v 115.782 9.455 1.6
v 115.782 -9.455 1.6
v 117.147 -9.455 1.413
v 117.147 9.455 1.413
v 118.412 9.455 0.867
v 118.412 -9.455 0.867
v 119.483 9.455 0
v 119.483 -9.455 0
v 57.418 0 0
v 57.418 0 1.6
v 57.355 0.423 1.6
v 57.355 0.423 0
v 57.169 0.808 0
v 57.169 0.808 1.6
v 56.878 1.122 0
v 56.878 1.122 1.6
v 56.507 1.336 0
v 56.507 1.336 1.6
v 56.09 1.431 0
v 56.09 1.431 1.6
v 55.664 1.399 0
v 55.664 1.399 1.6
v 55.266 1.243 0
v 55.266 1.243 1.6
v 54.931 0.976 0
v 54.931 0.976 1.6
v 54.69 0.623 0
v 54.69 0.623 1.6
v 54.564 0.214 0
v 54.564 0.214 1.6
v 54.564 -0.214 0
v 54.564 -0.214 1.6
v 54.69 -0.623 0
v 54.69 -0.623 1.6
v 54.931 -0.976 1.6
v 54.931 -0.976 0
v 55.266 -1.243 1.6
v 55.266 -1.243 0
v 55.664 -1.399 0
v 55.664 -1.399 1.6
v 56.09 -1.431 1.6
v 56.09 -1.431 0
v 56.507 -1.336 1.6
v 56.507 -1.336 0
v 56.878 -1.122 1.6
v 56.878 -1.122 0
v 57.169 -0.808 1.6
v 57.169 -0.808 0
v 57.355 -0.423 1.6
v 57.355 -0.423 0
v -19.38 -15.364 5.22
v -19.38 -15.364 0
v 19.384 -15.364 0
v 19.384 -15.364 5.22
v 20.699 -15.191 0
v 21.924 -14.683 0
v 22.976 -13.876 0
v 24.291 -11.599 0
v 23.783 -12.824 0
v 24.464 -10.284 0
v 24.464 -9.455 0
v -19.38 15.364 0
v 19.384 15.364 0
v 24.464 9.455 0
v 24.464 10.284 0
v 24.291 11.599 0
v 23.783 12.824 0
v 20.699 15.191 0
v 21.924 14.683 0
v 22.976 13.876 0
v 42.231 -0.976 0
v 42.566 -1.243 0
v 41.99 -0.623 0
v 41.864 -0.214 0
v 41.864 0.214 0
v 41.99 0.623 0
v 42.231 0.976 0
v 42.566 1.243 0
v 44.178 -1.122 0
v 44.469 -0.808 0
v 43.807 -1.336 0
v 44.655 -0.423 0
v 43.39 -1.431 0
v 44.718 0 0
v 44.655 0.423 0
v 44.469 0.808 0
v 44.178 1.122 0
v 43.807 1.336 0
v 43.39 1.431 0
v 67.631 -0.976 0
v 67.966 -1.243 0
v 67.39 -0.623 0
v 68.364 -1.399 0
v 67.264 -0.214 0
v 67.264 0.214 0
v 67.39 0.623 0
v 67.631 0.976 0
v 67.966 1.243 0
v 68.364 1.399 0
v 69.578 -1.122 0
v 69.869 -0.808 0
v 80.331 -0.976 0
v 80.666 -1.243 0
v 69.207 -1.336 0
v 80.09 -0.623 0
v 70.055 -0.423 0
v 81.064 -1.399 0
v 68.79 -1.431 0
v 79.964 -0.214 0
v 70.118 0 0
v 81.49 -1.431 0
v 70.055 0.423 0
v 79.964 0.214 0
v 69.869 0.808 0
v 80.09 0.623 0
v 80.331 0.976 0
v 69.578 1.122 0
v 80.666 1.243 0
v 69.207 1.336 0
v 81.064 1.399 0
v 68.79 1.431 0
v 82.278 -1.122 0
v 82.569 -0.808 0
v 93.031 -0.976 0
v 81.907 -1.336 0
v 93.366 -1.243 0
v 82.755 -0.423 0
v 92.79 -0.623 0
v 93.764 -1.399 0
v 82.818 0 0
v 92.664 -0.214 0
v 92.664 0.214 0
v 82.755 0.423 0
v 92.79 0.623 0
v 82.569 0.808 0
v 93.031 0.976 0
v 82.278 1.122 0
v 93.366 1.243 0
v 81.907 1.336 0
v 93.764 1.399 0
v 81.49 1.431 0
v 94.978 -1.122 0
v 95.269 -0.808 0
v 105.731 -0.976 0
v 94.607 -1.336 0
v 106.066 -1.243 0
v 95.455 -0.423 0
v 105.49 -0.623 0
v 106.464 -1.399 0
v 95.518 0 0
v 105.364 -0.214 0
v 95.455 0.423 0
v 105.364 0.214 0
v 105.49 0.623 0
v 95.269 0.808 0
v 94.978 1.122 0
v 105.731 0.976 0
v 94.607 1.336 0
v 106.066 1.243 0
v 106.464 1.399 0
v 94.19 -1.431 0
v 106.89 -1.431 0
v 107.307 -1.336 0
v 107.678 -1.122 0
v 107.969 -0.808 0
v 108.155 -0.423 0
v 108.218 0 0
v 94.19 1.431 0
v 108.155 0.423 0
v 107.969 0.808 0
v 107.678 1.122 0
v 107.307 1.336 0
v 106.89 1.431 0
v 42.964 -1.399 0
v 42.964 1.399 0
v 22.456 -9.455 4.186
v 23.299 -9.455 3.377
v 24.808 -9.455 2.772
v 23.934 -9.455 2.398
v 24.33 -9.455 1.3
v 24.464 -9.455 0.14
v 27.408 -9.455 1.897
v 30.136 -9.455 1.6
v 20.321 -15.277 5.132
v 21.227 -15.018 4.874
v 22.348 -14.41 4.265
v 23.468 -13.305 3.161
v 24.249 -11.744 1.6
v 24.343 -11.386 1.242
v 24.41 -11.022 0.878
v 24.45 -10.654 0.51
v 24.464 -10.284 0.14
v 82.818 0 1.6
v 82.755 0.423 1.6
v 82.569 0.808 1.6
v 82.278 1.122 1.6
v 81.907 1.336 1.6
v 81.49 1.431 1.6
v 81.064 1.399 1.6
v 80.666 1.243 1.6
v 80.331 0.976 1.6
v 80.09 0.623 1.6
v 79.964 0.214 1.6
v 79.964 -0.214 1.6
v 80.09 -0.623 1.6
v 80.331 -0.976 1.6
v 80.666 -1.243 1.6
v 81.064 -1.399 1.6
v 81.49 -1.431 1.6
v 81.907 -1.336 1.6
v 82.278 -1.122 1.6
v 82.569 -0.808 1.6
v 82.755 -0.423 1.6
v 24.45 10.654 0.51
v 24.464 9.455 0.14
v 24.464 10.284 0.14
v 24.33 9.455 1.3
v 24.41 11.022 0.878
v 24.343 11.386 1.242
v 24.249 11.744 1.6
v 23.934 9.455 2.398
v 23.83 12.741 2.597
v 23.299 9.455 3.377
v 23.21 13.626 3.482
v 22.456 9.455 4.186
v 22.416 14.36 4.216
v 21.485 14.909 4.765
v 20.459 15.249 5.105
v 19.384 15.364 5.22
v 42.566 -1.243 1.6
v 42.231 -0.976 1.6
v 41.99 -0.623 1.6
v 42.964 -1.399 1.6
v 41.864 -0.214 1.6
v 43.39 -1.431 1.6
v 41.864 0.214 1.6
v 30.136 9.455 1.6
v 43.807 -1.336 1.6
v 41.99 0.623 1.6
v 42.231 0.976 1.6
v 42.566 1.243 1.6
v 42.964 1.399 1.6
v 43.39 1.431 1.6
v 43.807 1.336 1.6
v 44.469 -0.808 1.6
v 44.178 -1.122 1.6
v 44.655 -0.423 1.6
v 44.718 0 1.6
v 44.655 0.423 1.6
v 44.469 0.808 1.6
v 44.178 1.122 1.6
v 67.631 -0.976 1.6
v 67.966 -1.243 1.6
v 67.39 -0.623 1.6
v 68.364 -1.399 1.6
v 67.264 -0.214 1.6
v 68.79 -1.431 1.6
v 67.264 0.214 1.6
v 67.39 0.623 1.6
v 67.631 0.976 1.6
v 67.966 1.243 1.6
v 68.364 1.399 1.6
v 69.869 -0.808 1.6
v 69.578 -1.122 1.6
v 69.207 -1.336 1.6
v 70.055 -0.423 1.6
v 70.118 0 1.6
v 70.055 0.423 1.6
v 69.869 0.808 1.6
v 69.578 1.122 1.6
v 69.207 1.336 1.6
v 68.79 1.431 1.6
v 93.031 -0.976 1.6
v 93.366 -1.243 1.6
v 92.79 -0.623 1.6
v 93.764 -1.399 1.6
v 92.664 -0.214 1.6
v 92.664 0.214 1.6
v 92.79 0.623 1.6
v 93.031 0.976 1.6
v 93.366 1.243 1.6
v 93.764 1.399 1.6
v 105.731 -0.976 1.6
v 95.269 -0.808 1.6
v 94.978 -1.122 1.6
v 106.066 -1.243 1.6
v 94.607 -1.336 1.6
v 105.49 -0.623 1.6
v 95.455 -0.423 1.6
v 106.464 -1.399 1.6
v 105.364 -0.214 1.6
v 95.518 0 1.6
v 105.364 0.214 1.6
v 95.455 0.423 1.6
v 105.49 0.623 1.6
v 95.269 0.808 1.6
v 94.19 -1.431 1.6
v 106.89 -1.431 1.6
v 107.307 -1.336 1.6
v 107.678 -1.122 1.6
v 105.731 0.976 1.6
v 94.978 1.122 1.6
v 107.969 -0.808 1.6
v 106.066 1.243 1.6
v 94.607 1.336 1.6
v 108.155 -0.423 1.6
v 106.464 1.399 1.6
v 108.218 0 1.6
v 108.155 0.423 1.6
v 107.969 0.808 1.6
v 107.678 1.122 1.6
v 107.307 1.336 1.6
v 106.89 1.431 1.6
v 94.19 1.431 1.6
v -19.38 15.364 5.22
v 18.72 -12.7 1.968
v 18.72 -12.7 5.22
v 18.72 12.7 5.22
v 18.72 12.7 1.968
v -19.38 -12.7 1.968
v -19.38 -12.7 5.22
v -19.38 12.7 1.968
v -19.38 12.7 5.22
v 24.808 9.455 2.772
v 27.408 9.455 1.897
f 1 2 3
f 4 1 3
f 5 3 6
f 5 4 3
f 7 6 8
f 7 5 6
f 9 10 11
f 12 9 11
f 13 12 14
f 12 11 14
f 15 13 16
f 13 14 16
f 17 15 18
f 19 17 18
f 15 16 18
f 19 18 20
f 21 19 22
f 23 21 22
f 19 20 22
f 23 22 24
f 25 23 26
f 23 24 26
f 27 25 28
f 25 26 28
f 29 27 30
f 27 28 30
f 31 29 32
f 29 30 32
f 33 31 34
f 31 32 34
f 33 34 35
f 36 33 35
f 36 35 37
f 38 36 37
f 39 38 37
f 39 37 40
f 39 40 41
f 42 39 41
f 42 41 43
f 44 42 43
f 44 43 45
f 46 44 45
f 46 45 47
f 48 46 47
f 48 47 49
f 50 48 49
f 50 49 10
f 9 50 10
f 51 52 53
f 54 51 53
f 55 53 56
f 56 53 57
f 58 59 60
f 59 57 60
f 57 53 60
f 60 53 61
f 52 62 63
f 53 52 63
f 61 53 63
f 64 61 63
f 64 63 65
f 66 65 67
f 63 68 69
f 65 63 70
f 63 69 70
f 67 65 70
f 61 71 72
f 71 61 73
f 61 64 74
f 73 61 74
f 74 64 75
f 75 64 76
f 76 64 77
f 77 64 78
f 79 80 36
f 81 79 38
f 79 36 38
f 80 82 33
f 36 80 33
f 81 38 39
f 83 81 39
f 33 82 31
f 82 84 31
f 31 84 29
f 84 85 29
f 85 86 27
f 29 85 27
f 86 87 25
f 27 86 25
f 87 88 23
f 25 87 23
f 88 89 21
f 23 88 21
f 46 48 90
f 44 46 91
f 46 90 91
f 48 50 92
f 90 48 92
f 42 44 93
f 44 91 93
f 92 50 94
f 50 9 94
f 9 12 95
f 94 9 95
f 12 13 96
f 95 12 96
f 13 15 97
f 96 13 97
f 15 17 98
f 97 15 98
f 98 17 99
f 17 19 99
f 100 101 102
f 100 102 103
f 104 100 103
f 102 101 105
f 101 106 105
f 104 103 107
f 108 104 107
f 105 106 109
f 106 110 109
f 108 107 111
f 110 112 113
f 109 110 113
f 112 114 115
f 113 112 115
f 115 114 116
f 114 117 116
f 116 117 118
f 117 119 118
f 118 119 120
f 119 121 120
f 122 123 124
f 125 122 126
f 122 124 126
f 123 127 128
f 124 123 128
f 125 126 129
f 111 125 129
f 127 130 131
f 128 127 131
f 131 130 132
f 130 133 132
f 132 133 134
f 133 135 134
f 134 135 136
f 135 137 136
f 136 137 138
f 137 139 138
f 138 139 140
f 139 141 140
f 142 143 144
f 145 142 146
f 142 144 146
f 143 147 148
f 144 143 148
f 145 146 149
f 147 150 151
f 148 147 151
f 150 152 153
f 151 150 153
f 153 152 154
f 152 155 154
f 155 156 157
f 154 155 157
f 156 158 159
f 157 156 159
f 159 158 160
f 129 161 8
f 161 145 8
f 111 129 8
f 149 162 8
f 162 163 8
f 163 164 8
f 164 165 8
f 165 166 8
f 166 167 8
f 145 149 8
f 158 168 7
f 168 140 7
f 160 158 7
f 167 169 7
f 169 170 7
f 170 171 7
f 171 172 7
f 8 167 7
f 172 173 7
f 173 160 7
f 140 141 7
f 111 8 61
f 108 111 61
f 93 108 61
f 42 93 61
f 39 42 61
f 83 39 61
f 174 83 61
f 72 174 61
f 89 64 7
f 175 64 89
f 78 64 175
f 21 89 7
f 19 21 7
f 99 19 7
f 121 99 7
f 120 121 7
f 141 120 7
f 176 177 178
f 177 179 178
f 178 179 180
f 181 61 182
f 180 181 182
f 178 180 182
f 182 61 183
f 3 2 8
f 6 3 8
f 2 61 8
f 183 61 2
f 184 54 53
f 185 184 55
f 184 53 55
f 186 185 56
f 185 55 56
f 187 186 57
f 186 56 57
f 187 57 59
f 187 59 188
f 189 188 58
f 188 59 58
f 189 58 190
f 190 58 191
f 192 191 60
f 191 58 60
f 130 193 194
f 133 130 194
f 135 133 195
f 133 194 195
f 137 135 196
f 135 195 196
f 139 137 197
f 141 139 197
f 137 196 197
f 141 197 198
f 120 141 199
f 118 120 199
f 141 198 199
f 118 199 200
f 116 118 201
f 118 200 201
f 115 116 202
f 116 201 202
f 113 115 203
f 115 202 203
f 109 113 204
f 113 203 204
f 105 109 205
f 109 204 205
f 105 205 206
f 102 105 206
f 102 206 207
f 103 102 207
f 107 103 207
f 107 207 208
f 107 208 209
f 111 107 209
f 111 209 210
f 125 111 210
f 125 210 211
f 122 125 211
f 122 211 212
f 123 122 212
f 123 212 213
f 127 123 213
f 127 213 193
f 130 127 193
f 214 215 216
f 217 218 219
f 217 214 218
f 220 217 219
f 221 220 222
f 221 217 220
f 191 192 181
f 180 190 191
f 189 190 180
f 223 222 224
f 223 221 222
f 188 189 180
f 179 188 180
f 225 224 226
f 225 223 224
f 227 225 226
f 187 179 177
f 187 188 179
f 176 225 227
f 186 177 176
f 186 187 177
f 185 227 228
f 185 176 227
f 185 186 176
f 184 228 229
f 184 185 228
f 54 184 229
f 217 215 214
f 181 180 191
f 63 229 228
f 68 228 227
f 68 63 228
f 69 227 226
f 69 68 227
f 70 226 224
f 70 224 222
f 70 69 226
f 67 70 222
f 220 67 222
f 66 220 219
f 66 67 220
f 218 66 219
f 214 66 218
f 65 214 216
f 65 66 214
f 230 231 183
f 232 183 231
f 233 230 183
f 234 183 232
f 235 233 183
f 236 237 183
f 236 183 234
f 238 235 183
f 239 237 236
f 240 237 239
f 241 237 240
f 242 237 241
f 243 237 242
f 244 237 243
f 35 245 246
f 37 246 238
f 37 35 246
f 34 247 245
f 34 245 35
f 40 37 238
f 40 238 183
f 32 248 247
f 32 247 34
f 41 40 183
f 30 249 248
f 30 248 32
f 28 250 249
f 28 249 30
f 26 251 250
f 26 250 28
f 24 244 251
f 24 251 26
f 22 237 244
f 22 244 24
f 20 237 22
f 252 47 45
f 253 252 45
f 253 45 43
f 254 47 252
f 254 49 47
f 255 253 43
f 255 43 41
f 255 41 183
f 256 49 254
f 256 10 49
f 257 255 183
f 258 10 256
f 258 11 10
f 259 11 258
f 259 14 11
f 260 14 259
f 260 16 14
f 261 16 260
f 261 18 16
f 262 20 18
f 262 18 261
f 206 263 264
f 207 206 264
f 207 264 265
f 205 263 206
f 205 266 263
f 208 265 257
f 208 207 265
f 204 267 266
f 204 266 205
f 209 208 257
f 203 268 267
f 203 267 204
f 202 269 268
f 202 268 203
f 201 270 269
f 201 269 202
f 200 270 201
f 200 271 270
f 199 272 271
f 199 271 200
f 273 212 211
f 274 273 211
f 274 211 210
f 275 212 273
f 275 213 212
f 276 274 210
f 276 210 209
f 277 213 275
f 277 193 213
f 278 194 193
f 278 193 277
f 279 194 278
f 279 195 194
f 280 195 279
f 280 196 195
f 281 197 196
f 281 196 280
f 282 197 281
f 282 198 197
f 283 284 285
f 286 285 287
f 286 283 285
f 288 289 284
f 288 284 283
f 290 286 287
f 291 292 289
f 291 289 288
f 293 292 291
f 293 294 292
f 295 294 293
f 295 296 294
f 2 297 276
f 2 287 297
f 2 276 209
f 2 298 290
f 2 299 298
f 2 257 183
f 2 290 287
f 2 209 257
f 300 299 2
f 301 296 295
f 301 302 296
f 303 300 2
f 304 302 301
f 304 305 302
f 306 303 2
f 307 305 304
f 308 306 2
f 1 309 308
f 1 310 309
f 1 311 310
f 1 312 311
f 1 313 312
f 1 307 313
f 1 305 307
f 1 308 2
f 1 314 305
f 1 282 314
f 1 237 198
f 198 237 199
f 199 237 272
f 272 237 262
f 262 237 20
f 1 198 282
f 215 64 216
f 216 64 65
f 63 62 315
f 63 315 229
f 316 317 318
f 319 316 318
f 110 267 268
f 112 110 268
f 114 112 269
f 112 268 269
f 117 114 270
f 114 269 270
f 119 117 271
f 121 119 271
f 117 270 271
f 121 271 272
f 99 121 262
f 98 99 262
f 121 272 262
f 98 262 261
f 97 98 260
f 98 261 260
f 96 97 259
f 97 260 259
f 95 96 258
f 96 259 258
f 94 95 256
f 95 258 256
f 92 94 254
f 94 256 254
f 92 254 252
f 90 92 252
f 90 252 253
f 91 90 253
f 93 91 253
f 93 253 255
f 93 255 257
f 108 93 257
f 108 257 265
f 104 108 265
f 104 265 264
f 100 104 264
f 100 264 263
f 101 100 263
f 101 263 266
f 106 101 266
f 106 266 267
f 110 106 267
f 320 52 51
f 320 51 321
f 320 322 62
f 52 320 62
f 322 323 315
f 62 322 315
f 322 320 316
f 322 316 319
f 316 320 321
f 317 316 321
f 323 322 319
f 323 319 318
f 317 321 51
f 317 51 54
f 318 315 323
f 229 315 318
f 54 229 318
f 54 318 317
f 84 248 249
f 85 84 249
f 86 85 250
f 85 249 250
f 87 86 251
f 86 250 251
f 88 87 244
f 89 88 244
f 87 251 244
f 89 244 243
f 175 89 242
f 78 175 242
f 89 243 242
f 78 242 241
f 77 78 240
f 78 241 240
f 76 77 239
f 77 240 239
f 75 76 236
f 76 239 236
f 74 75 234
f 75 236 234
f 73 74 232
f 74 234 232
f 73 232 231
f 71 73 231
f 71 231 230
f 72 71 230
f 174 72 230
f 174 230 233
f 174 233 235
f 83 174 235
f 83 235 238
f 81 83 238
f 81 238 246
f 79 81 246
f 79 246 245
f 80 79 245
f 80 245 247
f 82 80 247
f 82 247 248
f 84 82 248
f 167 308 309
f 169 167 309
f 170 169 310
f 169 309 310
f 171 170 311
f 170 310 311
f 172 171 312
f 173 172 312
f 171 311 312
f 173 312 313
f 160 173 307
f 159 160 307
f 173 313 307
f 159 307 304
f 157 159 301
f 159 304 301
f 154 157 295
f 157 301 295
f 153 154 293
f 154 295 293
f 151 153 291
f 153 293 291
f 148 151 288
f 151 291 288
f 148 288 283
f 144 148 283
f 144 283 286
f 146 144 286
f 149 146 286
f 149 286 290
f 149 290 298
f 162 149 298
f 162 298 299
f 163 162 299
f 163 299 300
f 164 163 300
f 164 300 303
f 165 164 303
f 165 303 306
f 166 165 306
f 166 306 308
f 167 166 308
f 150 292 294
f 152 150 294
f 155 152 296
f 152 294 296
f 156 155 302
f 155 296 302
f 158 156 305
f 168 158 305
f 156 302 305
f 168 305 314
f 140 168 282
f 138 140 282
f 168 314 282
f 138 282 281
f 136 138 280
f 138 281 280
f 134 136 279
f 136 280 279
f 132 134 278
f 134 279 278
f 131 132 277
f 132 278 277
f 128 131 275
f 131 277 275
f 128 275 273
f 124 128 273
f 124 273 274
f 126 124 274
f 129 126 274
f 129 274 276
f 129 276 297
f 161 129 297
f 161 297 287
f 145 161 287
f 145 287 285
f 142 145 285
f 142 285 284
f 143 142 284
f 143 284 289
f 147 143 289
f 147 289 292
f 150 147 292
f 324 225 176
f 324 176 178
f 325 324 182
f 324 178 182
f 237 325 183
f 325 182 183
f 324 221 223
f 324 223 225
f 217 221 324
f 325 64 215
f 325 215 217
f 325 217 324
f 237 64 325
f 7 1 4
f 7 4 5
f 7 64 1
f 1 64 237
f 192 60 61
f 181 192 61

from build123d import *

# Parameters (mm, degrees)
F0_W         = 95.0192604214
F0_H         = 18.9093053341
F1_DEPTH     = 1.6002
F2_R         = 1.4351
F3_DEPTH     = 25.4
F4_R         = 1.397
F5_DEPTH     = 2.54
F6_W         = 48.927821219
F6_H         = 30.7276230305
F7_DEPTH     = 3.6195
F8_T1_DEPTH  = 30.6197
F8_T6_DEPTH  = 56.1276230305
F8_T12_DEPTH = 56.1276230305
F8_T18_DEPTH = 56.1276230305
F8_T25_DEPTH = 56.1276230305
F8_T31_DEPTH = 56.1276230305
F8_T37_DEPTH = 56.1276230305
F8_T43_DEPTH = 56.1276230305
F8_T49_DEPTH = 56.1276230305
F8_T56_DEPTH = 56.1276230305
F8_T62_DEPTH = 56.1276230305
F9_T1_DEPTH  = 37.4142992276
F10_R        = 12.7
F12_R        = 33.1286185238
F13_DEPTH    = 102.87
F14_W        = 25.4
F14_H        = 4.064
F15_DEPTH    = 38.1


# Not quite as in the source:
# - a fillet or chamfer that OpenCascade refuses, or shapes differently, is made with other operations: its cross-section is extruded or revolved along the edge and cut away or added


with BuildPart() as f1:
    # F0 (on Top) → F1 (new body)
    with BuildSketch(Plane.XY):
        Polygon((-24.4639106095, -15.3638115153), (24.4639106095, -15.3638115153), (24.4639106095, -9.454652667), (24.4639106095, 9.454652667), (24.4639106095, 15.3638115153), (-24.4639106095, 15.3638115153), (-24.4639106095, 9.454652667), (-24.4639106095, -9.454652667), align=None)
        with Locations((71.9735408202, 0)):
            Rectangle(F0_W, F0_H)
        with Locations((-71.9735408202, 0)):
            Rectangle(F0_W, F0_H)
    extrude(amount=F1_DEPTH)

    # F2 (on face) → F3 (cut)
    with BuildSketch(Plane.XY.offset(1.6002)):
        with Locations((106.7831710309, 0)):
            Circle(F2_R)
        with Locations((94.0831710309, 0)):
            Circle(F2_R)
        with Locations((81.3831710309, 0)):
            Circle(F2_R)
        with Locations((68.6831710309, 0)):
            Circle(F2_R)
        with Locations((55.9831710309, 0)):
            Circle(F2_R)
        with Locations((43.2831710309, 0)):
            Circle(F2_R)
    extrude(amount=-F3_DEPTH, mode=Mode.SUBTRACT)

    # F4 (on face) → F5 (join)
    with BuildSketch(Plane.XY.offset(1.6002)):
        with Locations((-106.7719441229, 0)):
            Circle(F4_R)
        with Locations((-94.0719441229, 0)):
            Circle(F4_R)
        with Locations((-81.3719441229, 0)):
            Circle(F4_R)
        with Locations((-68.6719441229, 0)):
            Circle(F4_R)
        with Locations((-55.9719441229, 0)):
            Circle(F4_R)
        with Locations((-43.2719441229, 0)):
            Circle(F4_R)
    extrude(amount=F5_DEPTH)

    # F6 (on face) → F7 (join)
    with BuildSketch(Plane.XY.offset(1.6002)):
        Rectangle(F6_W, F6_H)
    extrude(amount=F7_DEPTH)

    # F8: fillet of radius 5.08 on 6 edges, made by hand

    # F8_s2 → F8_t1 (cut)
    with BuildSketch(Plane.XY.offset(-12.7)):
        with BuildLine():
            ThreePointArc((-19.3839106095, 15.3638115153), (-22.9760130579, 13.8759139637), (-24.4639106095, 10.2838115153))
            Line((-24.4639106095, 10.2838115153), (-24.4639106095, 15.3638115153))
            Line((-24.4639106095, 15.3638115153), (-19.3839106095, 15.3638115153))
        make_face()
        with BuildLine():
            ThreePointArc((-19.3839106095, -15.3638115153), (-22.9760130579, -13.8759139637), (-24.4639106095, -10.2838115153))
            Line((-24.4639106095, -10.2838115153), (-24.4639106095, -15.3638115153))
            Line((-24.4639106095, -15.3638115153), (-19.3839106095, -15.3638115153))
        make_face()
        with BuildLine():
            ThreePointArc((19.3839106095, -15.3638115153), (22.9760130579, -13.8759139637), (24.4639106095, -10.2838115153))
            Line((24.4639106095, -10.2838115153), (24.4639106095, -15.3638115153))
            Line((24.4639106095, -15.3638115153), (19.3839106095, -15.3638115153))
        make_face()
        with BuildLine():
            ThreePointArc((19.3839106095, 15.3638115153), (22.9760130579, 13.8759139637), (24.4639106095, 10.2838115153))
            Line((24.4639106095, 10.2838115153), (24.4639106095, 15.3638115153))
            Line((24.4639106095, 15.3638115153), (19.3839106095, 15.3638115153))
        make_face()
    extrude(amount=F8_T1_DEPTH, mode=Mode.SUBTRACT)


with BuildPart() as f8_tool4:
    # F8_s5 → F8_t6 (new body)
    with BuildSketch(Plane.XZ.offset(28.0638115153)):
        with BuildLine():
            ThreePointArc((24.4639106095, 0.1397), (22.9760130579, 3.7318024484), (19.3839106095, 5.2197))
            Line((19.3839106095, 5.2197), (24.4639106095, 5.2197))
            Line((24.4639106095, 5.2197), (24.4639106095, 0.1397))
        make_face()
    extrude(amount=-F8_T6_DEPTH)

    split(bisect_by=Plane.XY.offset(1.6002), keep=Keep.BOTTOM)

    split(bisect_by=Plane.XZ.offset(9.454652667), keep=Keep.TOP)


with BuildPart() as f1_1:
    add(f1.part)

    # F8_t3: cut F8_tool4
    add(f8_tool4.part, mode=Mode.SUBTRACT)


with BuildPart() as f8_tool10:
    # F8_s11 → F8_t12 (new body)
    with BuildSketch(Plane.XZ.offset(28.0638115153)):
        with BuildLine():
            ThreePointArc((24.4639106095, 0.1397), (22.9760130579, 3.7318024484), (19.3839106095, 5.2197))
            Line((19.3839106095, 5.2197), (24.4639106095, 5.2197))
            Line((24.4639106095, 5.2197), (24.4639106095, 0.1397))
        make_face()
    extrude(amount=-F8_T12_DEPTH)

    split(bisect_by=Plane.XY.offset(1.6002), keep=Keep.TOP)

    split(bisect_by=Plane.XZ.offset(9.454652667), keep=Keep.TOP)


with BuildPart() as f1_2:
    add(f1_1.part)

    # F8_t9: cut F8_tool10
    add(f8_tool10.part, mode=Mode.SUBTRACT)


with BuildPart() as f8_tool16:
    # F8_s17 → F8_t18 (new body)
    with BuildSketch(Plane.XZ.offset(28.0638115153)):
        with BuildLine():
            ThreePointArc((24.4639106095, 0.1397), (22.9760130579, 3.7318024484), (19.3839106095, 5.2197))
            Line((19.3839106095, 5.2197), (24.4639106095, 5.2197))
            Line((24.4639106095, 5.2197), (24.4639106095, 0.1397))
        make_face()
    extrude(amount=-F8_T18_DEPTH)

    split(bisect_by=Plane.XY.offset(1.6002), keep=Keep.TOP)

    split(bisect_by=Plane.XZ.offset(-9.454652667), keep=Keep.TOP)

    split(bisect_by=Plane.XZ.offset(9.454652667), keep=Keep.BOTTOM)


with BuildPart() as f1_3:
    add(f1_2.part)

    # F8_t15: cut F8_tool16
    add(f8_tool16.part, mode=Mode.SUBTRACT)


with BuildPart() as f8_tool23:
    # F8_s24 → F8_t25 (new body)
    with BuildSketch(Plane.XZ.offset(28.0638115153)):
        with BuildLine():
            ThreePointArc((24.4639106095, 0.1397), (22.9760130579, 3.7318024484), (19.3839106095, 5.2197))
            Line((19.3839106095, 5.2197), (24.4639106095, 5.2197))
            Line((24.4639106095, 5.2197), (24.4639106095, 0.1397))
        make_face()
    extrude(amount=-F8_T25_DEPTH)

    split(bisect_by=Plane.XY.offset(1.6002), keep=Keep.BOTTOM)

    split(bisect_by=Plane.XZ.offset(-9.454652667), keep=Keep.BOTTOM)


with BuildPart() as f1_4:
    add(f1_3.part)

    # F8_t22: cut F8_tool23
    add(f8_tool23.part, mode=Mode.SUBTRACT)


with BuildPart() as f8_tool29:
    # F8_s30 → F8_t31 (new body)
    with BuildSketch(Plane.XZ.offset(28.0638115153)):
        with BuildLine():
            ThreePointArc((24.4639106095, 0.1397), (22.9760130579, 3.7318024484), (19.3839106095, 5.2197))
            Line((19.3839106095, 5.2197), (24.4639106095, 5.2197))
            Line((24.4639106095, 5.2197), (24.4639106095, 0.1397))
        make_face()
    extrude(amount=-F8_T31_DEPTH)

    split(bisect_by=Plane.XY.offset(1.6002), keep=Keep.TOP)

    split(bisect_by=Plane.XZ.offset(-9.454652667), keep=Keep.BOTTOM)


with BuildPart() as f1_5:
    add(f1_4.part)

    # F8_t28: cut F8_tool29
    add(f8_tool29.part, mode=Mode.SUBTRACT)


with BuildPart() as f8_tool35:
    # F8_s36 → F8_t37 (new body)
    with BuildSketch(Plane.XZ.offset(-28.0638115153)):
        with BuildLine():
            ThreePointArc((-19.3839106095, 5.2197), (-22.9760130579, 3.7318024484), (-24.4639106095, 0.1397))
            Line((-24.4639106095, 0.1397), (-24.4639106095, 5.2197))
            Line((-24.4639106095, 5.2197), (-19.3839106095, 5.2197))
        make_face()
    extrude(amount=F8_T37_DEPTH)

    split(bisect_by=Plane.XZ.offset(-9.454652667), keep=Keep.BOTTOM)

    split(bisect_by=Plane.XY.offset(1.6002), keep=Keep.TOP)


with BuildPart() as f1_6:
    add(f1_5.part)

    # F8_t34: cut F8_tool35
    add(f8_tool35.part, mode=Mode.SUBTRACT)


with BuildPart() as f8_tool41:
    # F8_s42 → F8_t43 (new body)
    with BuildSketch(Plane.XZ.offset(-28.0638115153)):
        with BuildLine():
            ThreePointArc((-19.3839106095, 5.2197), (-22.9760130579, 3.7318024484), (-24.4639106095, 0.1397))
            Line((-24.4639106095, 0.1397), (-24.4639106095, 5.2197))
            Line((-24.4639106095, 5.2197), (-19.3839106095, 5.2197))
        make_face()
    extrude(amount=F8_T43_DEPTH)

    split(bisect_by=Plane.XZ.offset(-9.454652667), keep=Keep.BOTTOM)

    split(bisect_by=Plane.XY.offset(1.6002), keep=Keep.BOTTOM)


with BuildPart() as f1_7:
    add(f1_6.part)

    # F8_t40: cut F8_tool41
    add(f8_tool41.part, mode=Mode.SUBTRACT)


with BuildPart() as f8_tool47:
    # F8_s48 → F8_t49 (new body)
    with BuildSketch(Plane.XZ.offset(-28.0638115153)):
        with BuildLine():
            ThreePointArc((-19.3839106095, 5.2197), (-22.9760130579, 3.7318024484), (-24.4639106095, 0.1397))
            Line((-24.4639106095, 0.1397), (-24.4639106095, 5.2197))
            Line((-24.4639106095, 5.2197), (-19.3839106095, 5.2197))
        make_face()
    extrude(amount=F8_T49_DEPTH)

    split(bisect_by=Plane.XZ.offset(-9.454652667), keep=Keep.TOP)

    split(bisect_by=Plane.XY.offset(1.6002), keep=Keep.TOP)

    split(bisect_by=Plane.XZ.offset(9.454652667), keep=Keep.BOTTOM)


with BuildPart() as f1_8:
    add(f1_7.part)

    # F8_t46: cut F8_tool47
    add(f8_tool47.part, mode=Mode.SUBTRACT)


with BuildPart() as f8_tool54:
    # F8_s55 → F8_t56 (new body)
    with BuildSketch(Plane.XZ.offset(-28.0638115153)):
        with BuildLine():
            ThreePointArc((-19.3839106095, 5.2197), (-22.9760130579, 3.7318024484), (-24.4639106095, 0.1397))
            Line((-24.4639106095, 0.1397), (-24.4639106095, 5.2197))
            Line((-24.4639106095, 5.2197), (-19.3839106095, 5.2197))
        make_face()
    extrude(amount=F8_T56_DEPTH)

    split(bisect_by=Plane.XY.offset(1.6002), keep=Keep.TOP)

    split(bisect_by=Plane.XZ.offset(9.454652667), keep=Keep.TOP)


with BuildPart() as f1_9:
    add(f1_8.part)

    # F8_t53: cut F8_tool54
    add(f8_tool54.part, mode=Mode.SUBTRACT)


with BuildPart() as f8_tool60:
    # F8_s61 → F8_t62 (new body)
    with BuildSketch(Plane.XZ.offset(-28.0638115153)):
        with BuildLine():
            ThreePointArc((-19.3839106095, 5.2197), (-22.9760130579, 3.7318024484), (-24.4639106095, 0.1397))
            Line((-24.4639106095, 0.1397), (-24.4639106095, 5.2197))
            Line((-24.4639106095, 5.2197), (-19.3839106095, 5.2197))
        make_face()
    extrude(amount=F8_T62_DEPTH)

    split(bisect_by=Plane.XY.offset(1.6002), keep=Keep.BOTTOM)

    split(bisect_by=Plane.XZ.offset(9.454652667), keep=Keep.TOP)


with BuildPart() as f1_10:
    add(f1_9.part)

    # F8_t59: cut F8_tool60
    add(f8_tool60.part, mode=Mode.SUBTRACT)

    # F9: fillet of radius 5.08 on 2 edges, made by hand

    # F9_s2 → F9_t1 (cut)
    with BuildSketch(Plane.XZ.offset(-18.7071496138)):
        with BuildLine():
            ThreePointArc((115.7821722522, 1.6002), (117.7982347512, 1.1830201767), (119.4831710309, 0))
            Line((119.4831710309, 0), (119.4831710309, 1.6002))
            Line((119.4831710309, 1.6002), (115.7821722522, 1.6002))
        make_face()
        with BuildLine():
            ThreePointArc((-119.4831710309, 0), (-117.7982347512, 1.1830201767), (-115.7821722522, 1.6002))
            Line((-115.7821722522, 1.6002), (-119.4831710309, 1.6002))
            Line((-119.4831710309, 1.6002), (-119.4831710309, 0))
        make_face()
    extrude(amount=F9_T1_DEPTH, mode=Mode.SUBTRACT)

    # F10
    f10_edges = [f1_10.edges().sort_by_distance(p)[0] for p in [
        (24.249436, 0, 1.6002),
        (-24.249436, 0, 1.6002),
    ]]
    fillet(f10_edges, radius=F10_R)

    # F12 (on offset) → F13 (cut)
    with BuildSketch(Plane.YZ.offset(-19.3802)):
        Circle(F12_R)
    extrude(amount=-F13_DEPTH, mode=Mode.SUBTRACT)

    # F14 (on offset) → F15 (cut)
    with BuildSketch(Plane.YZ.offset(-19.3802)):
        with Locations((0, 4.0005)):
            Rectangle(F14_W, F14_H)
    extrude(amount=F15_DEPTH, mode=Mode.SUBTRACT)


solid = f1_10.part
